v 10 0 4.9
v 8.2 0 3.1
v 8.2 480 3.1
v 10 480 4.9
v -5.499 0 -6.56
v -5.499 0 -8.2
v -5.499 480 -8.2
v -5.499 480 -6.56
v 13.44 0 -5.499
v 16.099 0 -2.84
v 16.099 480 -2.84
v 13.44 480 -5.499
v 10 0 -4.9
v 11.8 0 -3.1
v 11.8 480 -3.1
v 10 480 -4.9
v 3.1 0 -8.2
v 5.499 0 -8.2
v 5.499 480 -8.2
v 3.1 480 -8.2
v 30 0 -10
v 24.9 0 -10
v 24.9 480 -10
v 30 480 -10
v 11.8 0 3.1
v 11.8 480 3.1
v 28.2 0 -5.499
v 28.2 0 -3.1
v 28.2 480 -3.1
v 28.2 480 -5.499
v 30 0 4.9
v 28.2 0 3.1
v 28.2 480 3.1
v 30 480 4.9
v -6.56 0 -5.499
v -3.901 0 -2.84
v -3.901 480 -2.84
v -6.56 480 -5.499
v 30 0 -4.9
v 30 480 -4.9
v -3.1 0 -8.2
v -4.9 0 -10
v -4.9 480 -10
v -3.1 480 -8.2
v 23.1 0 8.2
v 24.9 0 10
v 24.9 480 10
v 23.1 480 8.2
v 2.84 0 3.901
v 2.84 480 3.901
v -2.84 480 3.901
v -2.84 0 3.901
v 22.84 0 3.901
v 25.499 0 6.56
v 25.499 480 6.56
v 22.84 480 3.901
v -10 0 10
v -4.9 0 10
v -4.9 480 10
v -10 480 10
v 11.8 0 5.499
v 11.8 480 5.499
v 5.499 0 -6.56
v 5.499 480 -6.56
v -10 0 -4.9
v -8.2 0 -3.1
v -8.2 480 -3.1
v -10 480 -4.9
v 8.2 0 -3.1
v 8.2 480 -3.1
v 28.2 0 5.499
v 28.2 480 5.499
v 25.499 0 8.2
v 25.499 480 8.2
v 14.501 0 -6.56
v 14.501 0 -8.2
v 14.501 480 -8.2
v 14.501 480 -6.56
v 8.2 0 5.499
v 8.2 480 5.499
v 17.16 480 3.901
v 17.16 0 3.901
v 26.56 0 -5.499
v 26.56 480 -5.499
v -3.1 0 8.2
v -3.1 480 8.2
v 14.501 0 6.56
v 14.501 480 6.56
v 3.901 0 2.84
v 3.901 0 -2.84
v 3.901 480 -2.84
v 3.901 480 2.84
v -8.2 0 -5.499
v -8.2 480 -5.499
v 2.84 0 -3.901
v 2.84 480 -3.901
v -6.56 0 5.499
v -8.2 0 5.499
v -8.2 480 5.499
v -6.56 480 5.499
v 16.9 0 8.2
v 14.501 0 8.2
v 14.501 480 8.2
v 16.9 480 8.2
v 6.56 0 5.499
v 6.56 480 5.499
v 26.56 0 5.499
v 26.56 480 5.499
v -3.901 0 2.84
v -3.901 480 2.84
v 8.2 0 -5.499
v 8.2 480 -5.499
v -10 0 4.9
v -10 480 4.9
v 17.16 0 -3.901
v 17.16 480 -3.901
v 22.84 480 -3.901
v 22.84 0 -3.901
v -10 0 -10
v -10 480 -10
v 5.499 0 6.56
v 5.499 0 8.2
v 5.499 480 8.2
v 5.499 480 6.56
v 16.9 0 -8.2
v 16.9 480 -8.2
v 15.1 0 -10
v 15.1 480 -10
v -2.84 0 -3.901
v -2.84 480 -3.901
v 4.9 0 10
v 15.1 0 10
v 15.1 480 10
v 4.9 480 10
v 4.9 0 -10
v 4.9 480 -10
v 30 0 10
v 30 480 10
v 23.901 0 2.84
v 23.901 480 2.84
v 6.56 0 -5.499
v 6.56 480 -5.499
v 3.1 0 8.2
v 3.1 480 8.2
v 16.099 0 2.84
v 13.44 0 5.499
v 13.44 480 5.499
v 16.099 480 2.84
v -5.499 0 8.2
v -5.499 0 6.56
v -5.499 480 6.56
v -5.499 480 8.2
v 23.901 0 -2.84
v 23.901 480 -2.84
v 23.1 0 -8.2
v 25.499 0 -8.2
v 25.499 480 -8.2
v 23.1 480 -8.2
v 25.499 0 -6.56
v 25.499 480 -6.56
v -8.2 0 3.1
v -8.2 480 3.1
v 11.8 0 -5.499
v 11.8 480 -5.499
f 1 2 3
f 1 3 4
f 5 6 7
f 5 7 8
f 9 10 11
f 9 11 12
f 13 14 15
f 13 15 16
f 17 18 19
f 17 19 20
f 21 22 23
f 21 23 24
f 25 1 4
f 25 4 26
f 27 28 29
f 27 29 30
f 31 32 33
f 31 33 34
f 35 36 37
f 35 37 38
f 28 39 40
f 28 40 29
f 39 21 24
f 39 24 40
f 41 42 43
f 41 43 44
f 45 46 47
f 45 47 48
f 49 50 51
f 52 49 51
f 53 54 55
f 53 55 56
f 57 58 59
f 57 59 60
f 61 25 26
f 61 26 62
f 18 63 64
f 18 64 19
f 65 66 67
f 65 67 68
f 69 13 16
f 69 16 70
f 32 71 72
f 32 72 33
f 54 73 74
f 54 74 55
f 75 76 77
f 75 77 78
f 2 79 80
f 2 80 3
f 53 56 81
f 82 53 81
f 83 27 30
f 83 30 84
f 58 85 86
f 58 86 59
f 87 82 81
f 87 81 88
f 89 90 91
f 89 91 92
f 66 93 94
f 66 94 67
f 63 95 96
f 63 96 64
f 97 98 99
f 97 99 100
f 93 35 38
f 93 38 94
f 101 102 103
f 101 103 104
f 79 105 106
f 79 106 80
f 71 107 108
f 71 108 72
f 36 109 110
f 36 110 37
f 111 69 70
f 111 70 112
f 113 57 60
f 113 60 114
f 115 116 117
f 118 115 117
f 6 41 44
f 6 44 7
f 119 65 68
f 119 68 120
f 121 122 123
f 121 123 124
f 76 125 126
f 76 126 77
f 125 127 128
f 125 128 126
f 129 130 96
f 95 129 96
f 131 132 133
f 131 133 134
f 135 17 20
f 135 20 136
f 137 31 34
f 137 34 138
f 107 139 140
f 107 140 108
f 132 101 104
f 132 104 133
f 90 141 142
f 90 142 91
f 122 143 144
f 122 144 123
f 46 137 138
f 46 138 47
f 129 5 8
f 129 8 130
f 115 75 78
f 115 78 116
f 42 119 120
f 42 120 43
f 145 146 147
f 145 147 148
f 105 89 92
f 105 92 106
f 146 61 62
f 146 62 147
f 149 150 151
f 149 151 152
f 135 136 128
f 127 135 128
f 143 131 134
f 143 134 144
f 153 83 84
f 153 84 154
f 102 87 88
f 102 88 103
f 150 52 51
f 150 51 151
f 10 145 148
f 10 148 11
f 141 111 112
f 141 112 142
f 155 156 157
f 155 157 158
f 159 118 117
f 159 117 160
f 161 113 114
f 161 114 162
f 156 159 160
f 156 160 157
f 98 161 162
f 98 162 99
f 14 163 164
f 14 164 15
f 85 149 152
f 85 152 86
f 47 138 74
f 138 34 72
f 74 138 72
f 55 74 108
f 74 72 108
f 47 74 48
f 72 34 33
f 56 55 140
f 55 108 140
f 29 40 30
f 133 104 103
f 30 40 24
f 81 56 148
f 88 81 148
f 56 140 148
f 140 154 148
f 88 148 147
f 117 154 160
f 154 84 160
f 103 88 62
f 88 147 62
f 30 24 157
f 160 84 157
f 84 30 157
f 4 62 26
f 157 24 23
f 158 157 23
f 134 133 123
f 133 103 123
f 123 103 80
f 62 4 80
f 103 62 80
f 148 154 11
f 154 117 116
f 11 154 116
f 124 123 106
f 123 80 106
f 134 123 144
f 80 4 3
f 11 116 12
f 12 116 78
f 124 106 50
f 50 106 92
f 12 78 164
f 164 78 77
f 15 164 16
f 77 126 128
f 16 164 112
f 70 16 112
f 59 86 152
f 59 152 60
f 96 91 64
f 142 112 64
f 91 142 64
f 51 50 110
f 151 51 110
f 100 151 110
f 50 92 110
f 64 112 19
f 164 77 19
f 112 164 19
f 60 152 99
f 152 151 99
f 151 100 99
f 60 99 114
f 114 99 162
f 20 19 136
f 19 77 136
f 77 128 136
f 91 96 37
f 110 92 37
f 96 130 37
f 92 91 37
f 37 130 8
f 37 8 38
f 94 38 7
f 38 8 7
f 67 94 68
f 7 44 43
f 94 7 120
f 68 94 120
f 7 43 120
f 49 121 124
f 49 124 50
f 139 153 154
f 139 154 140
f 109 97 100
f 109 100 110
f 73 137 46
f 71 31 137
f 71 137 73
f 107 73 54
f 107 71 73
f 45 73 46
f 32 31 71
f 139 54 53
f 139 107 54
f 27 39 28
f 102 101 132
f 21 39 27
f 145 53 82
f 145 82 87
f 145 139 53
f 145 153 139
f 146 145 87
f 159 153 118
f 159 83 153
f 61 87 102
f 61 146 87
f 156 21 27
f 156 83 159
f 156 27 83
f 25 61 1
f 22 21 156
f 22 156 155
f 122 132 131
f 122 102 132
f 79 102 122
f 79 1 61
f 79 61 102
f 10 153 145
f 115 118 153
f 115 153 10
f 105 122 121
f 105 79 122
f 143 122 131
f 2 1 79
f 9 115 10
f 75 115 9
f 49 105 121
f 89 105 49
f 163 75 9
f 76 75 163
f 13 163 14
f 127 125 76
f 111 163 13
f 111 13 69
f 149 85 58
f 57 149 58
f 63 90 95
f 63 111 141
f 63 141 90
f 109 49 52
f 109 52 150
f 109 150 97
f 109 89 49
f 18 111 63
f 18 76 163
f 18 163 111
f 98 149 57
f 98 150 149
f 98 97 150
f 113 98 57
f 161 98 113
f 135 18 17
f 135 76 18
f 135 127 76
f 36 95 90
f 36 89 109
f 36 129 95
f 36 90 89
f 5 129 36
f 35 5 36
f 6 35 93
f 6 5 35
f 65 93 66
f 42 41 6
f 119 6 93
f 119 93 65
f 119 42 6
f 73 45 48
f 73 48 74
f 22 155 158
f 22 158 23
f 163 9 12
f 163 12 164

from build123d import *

# Parameters (mm, degrees)
BOSS_EXTRUDE1_DEPTH = 480
LPATTERN1_COUNT     = 2
LPATTERN1_PITCH     = 20


with BuildPart() as part:
    # Sketch1 → Boss-Extrude1 (new body)
    with BuildSketch(Plane(origin=(0, 0, 0), x_dir=(1, 0, 0), z_dir=(0, 1, 0))):
        Polygon((2.84, -3.900660172), (-2.84, -3.900660172), (-5.499339828, -6.56), (-5.499339828, -8.2), (-3.1, -8.2), (-4.9, -10), (-10, -10), (-10, -4.9), (-8.2, -3.1), (-8.2, -5.499339828), (-6.56, -5.499339828), (-3.900660172, -2.84), (-3.900660172, 2.84), (-6.56, 5.499339828), (-8.2, 5.499339828), (-8.2, 3.1), (-10, 4.9), (-10, 10), (-4.9, 10), (-3.1, 8.2), (-5.499339828, 8.2), (-5.499339828, 6.56), (-2.84, 3.900660172), (2.84, 3.900660172), (5.499339828, 6.56), (5.499339828, 8.2), (3.1, 8.2), (4.9, 10), (10, 10), (10, 4.9), (8.2, 3.1), (8.2, 5.499339828), (6.56, 5.499339828), (3.900660172, 2.84), (3.900660172, -2.84), (6.56, -5.499339828), (8.2, -5.499339828), (8.2, -3.1), (10, -4.9), (10, -10), (4.9, -10), (3.1, -8.2), (5.499339828, -8.2), (5.499339828, -6.56), align=None)
    boss_extrude1 = extrude(amount=BOSS_EXTRUDE1_DEPTH)

    # LPattern1: Boss-Extrude1 ×2
    with Locations(*[(i * LPATTERN1_PITCH, 0, 0) for i in range(1, LPATTERN1_COUNT)]):
        add(boss_extrude1)


solid = part.part
